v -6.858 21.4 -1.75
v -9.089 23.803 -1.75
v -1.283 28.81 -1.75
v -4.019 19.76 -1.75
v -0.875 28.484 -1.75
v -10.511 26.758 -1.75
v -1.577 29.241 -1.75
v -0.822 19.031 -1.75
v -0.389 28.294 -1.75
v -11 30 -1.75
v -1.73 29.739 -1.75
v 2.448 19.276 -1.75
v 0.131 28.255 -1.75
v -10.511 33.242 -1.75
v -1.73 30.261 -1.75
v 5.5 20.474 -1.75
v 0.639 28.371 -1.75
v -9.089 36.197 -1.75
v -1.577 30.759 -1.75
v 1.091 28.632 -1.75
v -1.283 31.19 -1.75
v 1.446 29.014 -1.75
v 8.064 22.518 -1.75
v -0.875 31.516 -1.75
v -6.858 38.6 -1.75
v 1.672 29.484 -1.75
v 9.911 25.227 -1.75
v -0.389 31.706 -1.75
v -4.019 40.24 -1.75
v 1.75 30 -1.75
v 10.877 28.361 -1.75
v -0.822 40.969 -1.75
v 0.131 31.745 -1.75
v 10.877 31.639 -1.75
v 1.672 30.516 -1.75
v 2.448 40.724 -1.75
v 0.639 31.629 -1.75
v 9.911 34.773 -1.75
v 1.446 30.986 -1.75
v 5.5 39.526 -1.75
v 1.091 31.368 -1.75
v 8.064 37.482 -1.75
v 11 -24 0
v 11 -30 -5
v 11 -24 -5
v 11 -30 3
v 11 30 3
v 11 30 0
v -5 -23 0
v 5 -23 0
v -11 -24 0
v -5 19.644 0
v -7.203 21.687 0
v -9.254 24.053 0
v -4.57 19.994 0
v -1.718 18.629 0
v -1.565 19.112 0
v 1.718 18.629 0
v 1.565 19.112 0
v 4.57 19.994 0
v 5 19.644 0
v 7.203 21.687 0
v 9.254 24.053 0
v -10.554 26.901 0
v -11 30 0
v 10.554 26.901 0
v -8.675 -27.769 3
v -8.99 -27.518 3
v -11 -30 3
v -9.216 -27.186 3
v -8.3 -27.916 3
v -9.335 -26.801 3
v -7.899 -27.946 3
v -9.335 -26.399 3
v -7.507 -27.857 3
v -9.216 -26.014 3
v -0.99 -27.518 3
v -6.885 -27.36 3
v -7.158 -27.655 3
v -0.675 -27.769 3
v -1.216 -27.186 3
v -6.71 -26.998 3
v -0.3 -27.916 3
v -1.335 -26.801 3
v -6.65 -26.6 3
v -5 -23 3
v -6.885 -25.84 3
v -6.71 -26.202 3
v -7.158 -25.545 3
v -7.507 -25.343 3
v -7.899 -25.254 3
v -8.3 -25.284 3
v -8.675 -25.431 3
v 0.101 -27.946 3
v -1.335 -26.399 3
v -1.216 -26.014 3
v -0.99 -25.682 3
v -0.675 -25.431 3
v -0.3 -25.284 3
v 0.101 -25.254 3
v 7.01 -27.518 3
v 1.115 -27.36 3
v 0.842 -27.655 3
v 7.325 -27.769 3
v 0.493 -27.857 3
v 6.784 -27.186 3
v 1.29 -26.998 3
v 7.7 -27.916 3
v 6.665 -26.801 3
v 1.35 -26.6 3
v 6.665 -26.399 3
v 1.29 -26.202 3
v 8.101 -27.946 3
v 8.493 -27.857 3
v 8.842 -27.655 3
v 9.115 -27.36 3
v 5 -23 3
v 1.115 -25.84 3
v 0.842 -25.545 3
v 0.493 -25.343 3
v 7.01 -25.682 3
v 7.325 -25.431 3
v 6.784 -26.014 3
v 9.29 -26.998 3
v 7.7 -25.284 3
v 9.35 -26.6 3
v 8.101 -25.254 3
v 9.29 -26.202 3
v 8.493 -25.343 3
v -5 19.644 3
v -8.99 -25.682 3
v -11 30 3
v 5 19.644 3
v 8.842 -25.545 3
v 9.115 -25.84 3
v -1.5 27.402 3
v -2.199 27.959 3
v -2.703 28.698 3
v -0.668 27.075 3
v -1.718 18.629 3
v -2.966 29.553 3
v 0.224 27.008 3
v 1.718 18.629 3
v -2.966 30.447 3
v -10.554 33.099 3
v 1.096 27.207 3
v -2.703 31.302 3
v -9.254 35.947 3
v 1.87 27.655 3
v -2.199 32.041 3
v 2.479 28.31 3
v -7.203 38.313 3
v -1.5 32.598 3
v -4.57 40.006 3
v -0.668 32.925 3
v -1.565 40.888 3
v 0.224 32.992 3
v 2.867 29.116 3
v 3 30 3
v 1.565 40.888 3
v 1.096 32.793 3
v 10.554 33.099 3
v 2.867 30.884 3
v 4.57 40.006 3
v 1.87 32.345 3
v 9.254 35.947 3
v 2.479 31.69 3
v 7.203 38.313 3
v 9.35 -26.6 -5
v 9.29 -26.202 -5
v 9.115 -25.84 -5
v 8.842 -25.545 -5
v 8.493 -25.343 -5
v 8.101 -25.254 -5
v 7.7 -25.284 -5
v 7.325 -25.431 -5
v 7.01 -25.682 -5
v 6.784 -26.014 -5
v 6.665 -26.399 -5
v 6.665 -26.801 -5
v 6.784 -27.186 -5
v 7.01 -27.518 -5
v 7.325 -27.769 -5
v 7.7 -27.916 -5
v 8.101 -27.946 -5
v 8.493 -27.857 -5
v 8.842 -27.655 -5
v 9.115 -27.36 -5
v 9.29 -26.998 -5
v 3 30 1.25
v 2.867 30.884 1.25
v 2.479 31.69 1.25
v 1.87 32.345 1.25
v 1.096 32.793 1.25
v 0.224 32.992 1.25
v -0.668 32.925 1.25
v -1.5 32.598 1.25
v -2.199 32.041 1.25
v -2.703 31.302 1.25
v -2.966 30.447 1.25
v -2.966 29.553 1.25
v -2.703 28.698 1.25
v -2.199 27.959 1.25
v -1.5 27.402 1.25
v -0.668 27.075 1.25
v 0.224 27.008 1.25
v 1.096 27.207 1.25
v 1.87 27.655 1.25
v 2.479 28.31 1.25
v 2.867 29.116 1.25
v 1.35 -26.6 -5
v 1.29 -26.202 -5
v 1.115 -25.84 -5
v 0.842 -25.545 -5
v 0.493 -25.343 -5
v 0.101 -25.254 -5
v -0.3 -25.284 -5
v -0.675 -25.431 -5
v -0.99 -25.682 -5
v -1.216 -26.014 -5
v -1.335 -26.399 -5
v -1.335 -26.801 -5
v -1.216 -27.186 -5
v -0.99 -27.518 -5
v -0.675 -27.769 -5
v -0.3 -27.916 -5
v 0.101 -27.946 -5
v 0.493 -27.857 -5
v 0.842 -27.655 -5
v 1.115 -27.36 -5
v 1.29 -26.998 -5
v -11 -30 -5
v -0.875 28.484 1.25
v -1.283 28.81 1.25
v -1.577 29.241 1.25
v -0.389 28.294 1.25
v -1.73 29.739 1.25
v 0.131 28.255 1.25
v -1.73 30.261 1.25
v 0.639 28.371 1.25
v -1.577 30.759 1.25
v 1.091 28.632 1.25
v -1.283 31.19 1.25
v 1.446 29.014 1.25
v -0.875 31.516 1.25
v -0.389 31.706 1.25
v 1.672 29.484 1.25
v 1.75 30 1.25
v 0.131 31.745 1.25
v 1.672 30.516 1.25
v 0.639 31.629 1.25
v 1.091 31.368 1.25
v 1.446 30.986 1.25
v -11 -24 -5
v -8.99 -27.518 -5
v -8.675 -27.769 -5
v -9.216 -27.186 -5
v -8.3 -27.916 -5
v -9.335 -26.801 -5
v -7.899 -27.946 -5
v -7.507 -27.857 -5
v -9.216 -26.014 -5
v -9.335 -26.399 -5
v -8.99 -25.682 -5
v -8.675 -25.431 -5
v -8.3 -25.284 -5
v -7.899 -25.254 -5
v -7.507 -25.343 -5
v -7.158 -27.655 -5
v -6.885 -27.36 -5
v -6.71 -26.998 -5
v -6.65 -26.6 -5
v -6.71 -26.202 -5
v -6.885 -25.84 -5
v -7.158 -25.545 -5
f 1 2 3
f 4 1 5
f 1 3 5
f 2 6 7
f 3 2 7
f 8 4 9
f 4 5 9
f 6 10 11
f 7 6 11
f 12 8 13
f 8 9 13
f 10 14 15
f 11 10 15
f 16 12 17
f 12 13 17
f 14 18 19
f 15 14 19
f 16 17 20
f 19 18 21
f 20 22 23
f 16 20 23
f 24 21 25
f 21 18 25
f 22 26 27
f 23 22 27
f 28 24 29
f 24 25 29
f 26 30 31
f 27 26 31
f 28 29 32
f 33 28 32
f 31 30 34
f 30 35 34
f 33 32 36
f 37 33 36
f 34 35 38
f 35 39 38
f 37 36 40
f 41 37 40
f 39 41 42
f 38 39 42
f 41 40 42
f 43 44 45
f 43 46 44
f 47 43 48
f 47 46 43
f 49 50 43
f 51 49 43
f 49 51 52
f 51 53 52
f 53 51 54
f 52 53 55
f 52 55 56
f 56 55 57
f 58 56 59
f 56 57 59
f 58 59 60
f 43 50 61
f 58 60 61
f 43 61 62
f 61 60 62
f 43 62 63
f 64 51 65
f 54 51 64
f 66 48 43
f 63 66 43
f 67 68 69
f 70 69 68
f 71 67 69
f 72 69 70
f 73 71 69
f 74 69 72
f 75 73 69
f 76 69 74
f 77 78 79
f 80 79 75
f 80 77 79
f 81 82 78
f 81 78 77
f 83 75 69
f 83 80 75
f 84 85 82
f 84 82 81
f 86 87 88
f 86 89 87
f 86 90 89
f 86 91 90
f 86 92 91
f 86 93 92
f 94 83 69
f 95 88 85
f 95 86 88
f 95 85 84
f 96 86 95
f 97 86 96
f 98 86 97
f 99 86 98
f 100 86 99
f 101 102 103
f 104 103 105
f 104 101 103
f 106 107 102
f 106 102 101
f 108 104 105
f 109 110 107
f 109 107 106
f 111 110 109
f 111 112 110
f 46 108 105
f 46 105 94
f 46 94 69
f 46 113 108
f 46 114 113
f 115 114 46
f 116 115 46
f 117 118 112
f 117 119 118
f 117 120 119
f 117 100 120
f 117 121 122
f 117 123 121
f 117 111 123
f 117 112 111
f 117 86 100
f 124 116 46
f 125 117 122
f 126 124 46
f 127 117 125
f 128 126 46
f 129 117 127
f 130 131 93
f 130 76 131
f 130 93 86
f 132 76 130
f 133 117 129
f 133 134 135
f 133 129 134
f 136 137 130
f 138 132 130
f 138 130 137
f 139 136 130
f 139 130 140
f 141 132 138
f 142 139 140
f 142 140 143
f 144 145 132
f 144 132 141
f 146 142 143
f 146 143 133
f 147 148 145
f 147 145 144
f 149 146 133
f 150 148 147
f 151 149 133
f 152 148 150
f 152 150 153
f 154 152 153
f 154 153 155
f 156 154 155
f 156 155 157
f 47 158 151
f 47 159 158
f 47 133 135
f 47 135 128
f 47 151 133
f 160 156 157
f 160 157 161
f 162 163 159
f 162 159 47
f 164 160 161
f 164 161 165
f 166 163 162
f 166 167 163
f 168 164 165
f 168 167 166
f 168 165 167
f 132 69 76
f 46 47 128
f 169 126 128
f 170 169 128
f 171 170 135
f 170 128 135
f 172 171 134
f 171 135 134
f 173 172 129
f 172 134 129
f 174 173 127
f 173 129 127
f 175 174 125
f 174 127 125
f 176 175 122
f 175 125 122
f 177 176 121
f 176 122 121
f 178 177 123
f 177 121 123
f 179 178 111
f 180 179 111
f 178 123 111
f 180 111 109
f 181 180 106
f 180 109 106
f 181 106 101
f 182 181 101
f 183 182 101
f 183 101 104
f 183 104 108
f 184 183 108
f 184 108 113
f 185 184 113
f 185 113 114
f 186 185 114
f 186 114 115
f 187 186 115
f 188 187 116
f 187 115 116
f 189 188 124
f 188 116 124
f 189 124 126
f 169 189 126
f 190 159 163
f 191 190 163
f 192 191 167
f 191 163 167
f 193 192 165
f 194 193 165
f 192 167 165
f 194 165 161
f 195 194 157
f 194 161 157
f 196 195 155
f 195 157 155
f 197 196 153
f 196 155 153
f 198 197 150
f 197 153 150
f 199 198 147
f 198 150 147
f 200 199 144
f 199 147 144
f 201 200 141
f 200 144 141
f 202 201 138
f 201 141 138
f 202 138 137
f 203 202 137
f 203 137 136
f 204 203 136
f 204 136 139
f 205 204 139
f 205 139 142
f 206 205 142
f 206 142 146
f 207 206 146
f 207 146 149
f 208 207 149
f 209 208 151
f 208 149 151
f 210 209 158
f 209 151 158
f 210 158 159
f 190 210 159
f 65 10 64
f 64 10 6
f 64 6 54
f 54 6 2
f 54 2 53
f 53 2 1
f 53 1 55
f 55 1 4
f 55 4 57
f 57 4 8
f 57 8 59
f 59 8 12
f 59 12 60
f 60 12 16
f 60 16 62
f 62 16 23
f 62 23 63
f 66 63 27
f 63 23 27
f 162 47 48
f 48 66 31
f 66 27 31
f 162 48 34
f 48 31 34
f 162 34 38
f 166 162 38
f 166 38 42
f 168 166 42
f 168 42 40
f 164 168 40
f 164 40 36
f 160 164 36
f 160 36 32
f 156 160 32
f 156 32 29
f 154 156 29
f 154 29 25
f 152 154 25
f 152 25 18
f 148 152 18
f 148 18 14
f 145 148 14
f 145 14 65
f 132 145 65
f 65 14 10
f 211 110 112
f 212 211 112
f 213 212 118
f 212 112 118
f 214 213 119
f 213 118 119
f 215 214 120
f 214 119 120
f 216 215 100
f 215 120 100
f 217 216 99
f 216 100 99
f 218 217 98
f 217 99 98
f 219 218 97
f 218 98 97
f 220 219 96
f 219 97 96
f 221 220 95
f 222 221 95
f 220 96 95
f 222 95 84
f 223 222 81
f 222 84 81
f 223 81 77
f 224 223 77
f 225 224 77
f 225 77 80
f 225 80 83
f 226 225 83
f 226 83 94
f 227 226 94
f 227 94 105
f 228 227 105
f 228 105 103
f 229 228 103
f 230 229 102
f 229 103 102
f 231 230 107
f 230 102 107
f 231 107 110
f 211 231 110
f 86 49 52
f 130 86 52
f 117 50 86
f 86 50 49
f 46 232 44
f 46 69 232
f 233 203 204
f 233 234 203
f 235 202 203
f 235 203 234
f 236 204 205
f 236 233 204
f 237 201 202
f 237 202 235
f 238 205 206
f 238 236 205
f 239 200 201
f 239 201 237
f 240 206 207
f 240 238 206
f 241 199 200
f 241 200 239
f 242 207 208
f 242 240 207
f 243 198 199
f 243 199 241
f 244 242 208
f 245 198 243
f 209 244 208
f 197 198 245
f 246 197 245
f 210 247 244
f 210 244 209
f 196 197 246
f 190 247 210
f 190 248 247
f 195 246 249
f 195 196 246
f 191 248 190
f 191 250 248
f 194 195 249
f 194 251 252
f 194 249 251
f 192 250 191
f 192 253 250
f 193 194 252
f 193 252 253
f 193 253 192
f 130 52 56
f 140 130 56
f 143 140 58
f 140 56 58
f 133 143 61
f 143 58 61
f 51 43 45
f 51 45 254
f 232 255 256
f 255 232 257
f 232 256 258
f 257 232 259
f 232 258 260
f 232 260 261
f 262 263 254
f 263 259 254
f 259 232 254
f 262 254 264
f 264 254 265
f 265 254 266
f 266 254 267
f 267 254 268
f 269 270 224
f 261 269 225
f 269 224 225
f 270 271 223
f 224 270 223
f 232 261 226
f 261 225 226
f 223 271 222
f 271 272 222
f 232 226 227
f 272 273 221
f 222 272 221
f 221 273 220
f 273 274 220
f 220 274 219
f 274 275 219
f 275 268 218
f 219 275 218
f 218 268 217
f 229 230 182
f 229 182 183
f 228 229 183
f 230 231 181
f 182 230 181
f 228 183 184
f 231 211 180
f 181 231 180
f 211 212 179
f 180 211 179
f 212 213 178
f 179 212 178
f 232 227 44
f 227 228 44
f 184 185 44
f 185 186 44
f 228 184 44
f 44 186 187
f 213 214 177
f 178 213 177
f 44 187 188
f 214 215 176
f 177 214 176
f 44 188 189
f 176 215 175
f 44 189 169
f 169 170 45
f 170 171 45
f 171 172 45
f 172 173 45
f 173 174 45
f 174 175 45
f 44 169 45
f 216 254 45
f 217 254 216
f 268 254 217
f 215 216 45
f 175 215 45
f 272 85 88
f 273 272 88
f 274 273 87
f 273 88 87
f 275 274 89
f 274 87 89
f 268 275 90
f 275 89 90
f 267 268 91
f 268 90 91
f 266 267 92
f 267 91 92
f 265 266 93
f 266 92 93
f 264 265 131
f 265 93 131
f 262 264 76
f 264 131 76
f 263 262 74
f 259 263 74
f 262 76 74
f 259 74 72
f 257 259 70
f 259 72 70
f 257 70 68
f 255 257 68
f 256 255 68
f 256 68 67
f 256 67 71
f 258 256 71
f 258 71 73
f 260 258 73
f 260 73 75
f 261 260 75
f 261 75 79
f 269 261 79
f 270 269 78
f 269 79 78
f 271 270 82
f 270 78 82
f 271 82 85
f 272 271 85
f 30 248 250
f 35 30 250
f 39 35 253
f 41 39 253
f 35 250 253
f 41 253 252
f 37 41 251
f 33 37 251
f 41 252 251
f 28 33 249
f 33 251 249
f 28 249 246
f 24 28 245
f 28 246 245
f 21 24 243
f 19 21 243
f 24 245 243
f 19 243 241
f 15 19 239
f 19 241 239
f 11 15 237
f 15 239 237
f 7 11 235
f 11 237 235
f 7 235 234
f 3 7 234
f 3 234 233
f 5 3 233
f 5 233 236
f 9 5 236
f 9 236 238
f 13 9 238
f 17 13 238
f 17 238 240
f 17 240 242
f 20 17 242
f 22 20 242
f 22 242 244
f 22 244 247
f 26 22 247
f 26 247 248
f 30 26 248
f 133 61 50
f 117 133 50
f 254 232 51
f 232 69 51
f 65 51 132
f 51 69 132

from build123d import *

# Parameters (mm, degrees)
BOSS_EXTRUDE1_DEPTH = 3
BOSS_EXTRUDE2_START = -1.75
BOSS_EXTRUDE2_DEPTH = 1.75
SKETCH2_R           = 1.75
CUT_EXTRUDE1_DEPTH  = 4.75
SKETCH2_3_R         = 3
CUT_EXTRUDE2_DEPTH  = 1.75
SKETCH1_6_W         = 11
SKETCH1_6_H         = 6
BOSS_EXTRUDE3_DEPTH = 5
SKETCH3_R           = 1.35
CUT_EXTRUDE3_DEPTH  = 8
LPATTERN1_COUNT     = 2
LPATTERN1_PITCH     = 8
LPATTERN1_COL_COUNT = 2
LPATTERN1_COL_PITCH = 8


with BuildPart() as part:
    # Sketch1 → Boss-Extrude1 (new body)
    with BuildSketch(Plane.XY):
        with BuildLine():
            Line((-11, 30), (-11, -30))
            Line((-11, -30), (11, -30))
            Line((11, -30), (11, 30))
            ThreePointArc((11, 30), (0, 41), (-11, 30))
        make_face()
        with BuildLine():
            Line((5, -23), (-5, -23))
            Line((-5, -23), (-5, 19.643842411))
            ThreePointArc((-5, 19.643842411), (0, 18.5), (5, 19.643842411))
            Line((5, 19.643842411), (5, -23))
        make_face(mode=Mode.SUBTRACT)
    extrude(amount=BOSS_EXTRUDE1_DEPTH)

    # Sketch1<3> → Boss-Extrude2 (add)
    with BuildSketch(Plane.XY.offset(BOSS_EXTRUDE2_START)):
        with BuildLine():
            ThreePointArc((11, 30), (0, 41), (-11, 30))
            ThreePointArc((-11, 30), (0, 19), (11, 30))
        make_face()
    extrude(amount=BOSS_EXTRUDE2_DEPTH)

    # Sketch2 → Cut-Extrude1 (cut)
    with BuildSketch(Plane.XY.offset(3)):
        with Locations((0, 30)):
            Circle(SKETCH2_R)
    extrude(amount=-CUT_EXTRUDE1_DEPTH, mode=Mode.SUBTRACT)

    # Sketch2<3> → Cut-Extrude2 (cut)
    with BuildSketch(Plane.XY.offset(3)):
        with Locations((0, 30)):
            Circle(SKETCH2_3_R)
    extrude(amount=-CUT_EXTRUDE2_DEPTH, mode=Mode.SUBTRACT)

    # Sketch1<6> → Boss-Extrude3 (add)
    with BuildSketch(Plane.XY):
        with Locations((5.5, -27)):
            Rectangle(SKETCH1_6_W, SKETCH1_6_H)
        with Locations((-5.5, -27)):
            Rectangle(SKETCH1_6_W, SKETCH1_6_H)
    extrude(amount=-BOSS_EXTRUDE3_DEPTH)

    # Sketch3 → Cut-Extrude3 (cut)
    with BuildSketch(Plane.XY.offset(3)):
        with Locations((0, -26.6)):
            Circle(SKETCH3_R)
    cut_extrude3 = extrude(amount=-CUT_EXTRUDE3_DEPTH, mode=Mode.SUBTRACT)

    # LPattern1: Cut-Extrude3 ×2
    with Locations(*[(i * LPATTERN1_PITCH, 0, 0) for i in range(1, LPATTERN1_COUNT)]):
        add(cut_extrude3, mode=Mode.SUBTRACT)

    # LPattern1 col: Cut-Extrude3 ×2
    with Locations(*[(-i * LPATTERN1_COL_PITCH, 0, 0) for i in range(1, LPATTERN1_COL_COUNT)]):
        add(cut_extrude3, mode=Mode.SUBTRACT)


solid = part.part
